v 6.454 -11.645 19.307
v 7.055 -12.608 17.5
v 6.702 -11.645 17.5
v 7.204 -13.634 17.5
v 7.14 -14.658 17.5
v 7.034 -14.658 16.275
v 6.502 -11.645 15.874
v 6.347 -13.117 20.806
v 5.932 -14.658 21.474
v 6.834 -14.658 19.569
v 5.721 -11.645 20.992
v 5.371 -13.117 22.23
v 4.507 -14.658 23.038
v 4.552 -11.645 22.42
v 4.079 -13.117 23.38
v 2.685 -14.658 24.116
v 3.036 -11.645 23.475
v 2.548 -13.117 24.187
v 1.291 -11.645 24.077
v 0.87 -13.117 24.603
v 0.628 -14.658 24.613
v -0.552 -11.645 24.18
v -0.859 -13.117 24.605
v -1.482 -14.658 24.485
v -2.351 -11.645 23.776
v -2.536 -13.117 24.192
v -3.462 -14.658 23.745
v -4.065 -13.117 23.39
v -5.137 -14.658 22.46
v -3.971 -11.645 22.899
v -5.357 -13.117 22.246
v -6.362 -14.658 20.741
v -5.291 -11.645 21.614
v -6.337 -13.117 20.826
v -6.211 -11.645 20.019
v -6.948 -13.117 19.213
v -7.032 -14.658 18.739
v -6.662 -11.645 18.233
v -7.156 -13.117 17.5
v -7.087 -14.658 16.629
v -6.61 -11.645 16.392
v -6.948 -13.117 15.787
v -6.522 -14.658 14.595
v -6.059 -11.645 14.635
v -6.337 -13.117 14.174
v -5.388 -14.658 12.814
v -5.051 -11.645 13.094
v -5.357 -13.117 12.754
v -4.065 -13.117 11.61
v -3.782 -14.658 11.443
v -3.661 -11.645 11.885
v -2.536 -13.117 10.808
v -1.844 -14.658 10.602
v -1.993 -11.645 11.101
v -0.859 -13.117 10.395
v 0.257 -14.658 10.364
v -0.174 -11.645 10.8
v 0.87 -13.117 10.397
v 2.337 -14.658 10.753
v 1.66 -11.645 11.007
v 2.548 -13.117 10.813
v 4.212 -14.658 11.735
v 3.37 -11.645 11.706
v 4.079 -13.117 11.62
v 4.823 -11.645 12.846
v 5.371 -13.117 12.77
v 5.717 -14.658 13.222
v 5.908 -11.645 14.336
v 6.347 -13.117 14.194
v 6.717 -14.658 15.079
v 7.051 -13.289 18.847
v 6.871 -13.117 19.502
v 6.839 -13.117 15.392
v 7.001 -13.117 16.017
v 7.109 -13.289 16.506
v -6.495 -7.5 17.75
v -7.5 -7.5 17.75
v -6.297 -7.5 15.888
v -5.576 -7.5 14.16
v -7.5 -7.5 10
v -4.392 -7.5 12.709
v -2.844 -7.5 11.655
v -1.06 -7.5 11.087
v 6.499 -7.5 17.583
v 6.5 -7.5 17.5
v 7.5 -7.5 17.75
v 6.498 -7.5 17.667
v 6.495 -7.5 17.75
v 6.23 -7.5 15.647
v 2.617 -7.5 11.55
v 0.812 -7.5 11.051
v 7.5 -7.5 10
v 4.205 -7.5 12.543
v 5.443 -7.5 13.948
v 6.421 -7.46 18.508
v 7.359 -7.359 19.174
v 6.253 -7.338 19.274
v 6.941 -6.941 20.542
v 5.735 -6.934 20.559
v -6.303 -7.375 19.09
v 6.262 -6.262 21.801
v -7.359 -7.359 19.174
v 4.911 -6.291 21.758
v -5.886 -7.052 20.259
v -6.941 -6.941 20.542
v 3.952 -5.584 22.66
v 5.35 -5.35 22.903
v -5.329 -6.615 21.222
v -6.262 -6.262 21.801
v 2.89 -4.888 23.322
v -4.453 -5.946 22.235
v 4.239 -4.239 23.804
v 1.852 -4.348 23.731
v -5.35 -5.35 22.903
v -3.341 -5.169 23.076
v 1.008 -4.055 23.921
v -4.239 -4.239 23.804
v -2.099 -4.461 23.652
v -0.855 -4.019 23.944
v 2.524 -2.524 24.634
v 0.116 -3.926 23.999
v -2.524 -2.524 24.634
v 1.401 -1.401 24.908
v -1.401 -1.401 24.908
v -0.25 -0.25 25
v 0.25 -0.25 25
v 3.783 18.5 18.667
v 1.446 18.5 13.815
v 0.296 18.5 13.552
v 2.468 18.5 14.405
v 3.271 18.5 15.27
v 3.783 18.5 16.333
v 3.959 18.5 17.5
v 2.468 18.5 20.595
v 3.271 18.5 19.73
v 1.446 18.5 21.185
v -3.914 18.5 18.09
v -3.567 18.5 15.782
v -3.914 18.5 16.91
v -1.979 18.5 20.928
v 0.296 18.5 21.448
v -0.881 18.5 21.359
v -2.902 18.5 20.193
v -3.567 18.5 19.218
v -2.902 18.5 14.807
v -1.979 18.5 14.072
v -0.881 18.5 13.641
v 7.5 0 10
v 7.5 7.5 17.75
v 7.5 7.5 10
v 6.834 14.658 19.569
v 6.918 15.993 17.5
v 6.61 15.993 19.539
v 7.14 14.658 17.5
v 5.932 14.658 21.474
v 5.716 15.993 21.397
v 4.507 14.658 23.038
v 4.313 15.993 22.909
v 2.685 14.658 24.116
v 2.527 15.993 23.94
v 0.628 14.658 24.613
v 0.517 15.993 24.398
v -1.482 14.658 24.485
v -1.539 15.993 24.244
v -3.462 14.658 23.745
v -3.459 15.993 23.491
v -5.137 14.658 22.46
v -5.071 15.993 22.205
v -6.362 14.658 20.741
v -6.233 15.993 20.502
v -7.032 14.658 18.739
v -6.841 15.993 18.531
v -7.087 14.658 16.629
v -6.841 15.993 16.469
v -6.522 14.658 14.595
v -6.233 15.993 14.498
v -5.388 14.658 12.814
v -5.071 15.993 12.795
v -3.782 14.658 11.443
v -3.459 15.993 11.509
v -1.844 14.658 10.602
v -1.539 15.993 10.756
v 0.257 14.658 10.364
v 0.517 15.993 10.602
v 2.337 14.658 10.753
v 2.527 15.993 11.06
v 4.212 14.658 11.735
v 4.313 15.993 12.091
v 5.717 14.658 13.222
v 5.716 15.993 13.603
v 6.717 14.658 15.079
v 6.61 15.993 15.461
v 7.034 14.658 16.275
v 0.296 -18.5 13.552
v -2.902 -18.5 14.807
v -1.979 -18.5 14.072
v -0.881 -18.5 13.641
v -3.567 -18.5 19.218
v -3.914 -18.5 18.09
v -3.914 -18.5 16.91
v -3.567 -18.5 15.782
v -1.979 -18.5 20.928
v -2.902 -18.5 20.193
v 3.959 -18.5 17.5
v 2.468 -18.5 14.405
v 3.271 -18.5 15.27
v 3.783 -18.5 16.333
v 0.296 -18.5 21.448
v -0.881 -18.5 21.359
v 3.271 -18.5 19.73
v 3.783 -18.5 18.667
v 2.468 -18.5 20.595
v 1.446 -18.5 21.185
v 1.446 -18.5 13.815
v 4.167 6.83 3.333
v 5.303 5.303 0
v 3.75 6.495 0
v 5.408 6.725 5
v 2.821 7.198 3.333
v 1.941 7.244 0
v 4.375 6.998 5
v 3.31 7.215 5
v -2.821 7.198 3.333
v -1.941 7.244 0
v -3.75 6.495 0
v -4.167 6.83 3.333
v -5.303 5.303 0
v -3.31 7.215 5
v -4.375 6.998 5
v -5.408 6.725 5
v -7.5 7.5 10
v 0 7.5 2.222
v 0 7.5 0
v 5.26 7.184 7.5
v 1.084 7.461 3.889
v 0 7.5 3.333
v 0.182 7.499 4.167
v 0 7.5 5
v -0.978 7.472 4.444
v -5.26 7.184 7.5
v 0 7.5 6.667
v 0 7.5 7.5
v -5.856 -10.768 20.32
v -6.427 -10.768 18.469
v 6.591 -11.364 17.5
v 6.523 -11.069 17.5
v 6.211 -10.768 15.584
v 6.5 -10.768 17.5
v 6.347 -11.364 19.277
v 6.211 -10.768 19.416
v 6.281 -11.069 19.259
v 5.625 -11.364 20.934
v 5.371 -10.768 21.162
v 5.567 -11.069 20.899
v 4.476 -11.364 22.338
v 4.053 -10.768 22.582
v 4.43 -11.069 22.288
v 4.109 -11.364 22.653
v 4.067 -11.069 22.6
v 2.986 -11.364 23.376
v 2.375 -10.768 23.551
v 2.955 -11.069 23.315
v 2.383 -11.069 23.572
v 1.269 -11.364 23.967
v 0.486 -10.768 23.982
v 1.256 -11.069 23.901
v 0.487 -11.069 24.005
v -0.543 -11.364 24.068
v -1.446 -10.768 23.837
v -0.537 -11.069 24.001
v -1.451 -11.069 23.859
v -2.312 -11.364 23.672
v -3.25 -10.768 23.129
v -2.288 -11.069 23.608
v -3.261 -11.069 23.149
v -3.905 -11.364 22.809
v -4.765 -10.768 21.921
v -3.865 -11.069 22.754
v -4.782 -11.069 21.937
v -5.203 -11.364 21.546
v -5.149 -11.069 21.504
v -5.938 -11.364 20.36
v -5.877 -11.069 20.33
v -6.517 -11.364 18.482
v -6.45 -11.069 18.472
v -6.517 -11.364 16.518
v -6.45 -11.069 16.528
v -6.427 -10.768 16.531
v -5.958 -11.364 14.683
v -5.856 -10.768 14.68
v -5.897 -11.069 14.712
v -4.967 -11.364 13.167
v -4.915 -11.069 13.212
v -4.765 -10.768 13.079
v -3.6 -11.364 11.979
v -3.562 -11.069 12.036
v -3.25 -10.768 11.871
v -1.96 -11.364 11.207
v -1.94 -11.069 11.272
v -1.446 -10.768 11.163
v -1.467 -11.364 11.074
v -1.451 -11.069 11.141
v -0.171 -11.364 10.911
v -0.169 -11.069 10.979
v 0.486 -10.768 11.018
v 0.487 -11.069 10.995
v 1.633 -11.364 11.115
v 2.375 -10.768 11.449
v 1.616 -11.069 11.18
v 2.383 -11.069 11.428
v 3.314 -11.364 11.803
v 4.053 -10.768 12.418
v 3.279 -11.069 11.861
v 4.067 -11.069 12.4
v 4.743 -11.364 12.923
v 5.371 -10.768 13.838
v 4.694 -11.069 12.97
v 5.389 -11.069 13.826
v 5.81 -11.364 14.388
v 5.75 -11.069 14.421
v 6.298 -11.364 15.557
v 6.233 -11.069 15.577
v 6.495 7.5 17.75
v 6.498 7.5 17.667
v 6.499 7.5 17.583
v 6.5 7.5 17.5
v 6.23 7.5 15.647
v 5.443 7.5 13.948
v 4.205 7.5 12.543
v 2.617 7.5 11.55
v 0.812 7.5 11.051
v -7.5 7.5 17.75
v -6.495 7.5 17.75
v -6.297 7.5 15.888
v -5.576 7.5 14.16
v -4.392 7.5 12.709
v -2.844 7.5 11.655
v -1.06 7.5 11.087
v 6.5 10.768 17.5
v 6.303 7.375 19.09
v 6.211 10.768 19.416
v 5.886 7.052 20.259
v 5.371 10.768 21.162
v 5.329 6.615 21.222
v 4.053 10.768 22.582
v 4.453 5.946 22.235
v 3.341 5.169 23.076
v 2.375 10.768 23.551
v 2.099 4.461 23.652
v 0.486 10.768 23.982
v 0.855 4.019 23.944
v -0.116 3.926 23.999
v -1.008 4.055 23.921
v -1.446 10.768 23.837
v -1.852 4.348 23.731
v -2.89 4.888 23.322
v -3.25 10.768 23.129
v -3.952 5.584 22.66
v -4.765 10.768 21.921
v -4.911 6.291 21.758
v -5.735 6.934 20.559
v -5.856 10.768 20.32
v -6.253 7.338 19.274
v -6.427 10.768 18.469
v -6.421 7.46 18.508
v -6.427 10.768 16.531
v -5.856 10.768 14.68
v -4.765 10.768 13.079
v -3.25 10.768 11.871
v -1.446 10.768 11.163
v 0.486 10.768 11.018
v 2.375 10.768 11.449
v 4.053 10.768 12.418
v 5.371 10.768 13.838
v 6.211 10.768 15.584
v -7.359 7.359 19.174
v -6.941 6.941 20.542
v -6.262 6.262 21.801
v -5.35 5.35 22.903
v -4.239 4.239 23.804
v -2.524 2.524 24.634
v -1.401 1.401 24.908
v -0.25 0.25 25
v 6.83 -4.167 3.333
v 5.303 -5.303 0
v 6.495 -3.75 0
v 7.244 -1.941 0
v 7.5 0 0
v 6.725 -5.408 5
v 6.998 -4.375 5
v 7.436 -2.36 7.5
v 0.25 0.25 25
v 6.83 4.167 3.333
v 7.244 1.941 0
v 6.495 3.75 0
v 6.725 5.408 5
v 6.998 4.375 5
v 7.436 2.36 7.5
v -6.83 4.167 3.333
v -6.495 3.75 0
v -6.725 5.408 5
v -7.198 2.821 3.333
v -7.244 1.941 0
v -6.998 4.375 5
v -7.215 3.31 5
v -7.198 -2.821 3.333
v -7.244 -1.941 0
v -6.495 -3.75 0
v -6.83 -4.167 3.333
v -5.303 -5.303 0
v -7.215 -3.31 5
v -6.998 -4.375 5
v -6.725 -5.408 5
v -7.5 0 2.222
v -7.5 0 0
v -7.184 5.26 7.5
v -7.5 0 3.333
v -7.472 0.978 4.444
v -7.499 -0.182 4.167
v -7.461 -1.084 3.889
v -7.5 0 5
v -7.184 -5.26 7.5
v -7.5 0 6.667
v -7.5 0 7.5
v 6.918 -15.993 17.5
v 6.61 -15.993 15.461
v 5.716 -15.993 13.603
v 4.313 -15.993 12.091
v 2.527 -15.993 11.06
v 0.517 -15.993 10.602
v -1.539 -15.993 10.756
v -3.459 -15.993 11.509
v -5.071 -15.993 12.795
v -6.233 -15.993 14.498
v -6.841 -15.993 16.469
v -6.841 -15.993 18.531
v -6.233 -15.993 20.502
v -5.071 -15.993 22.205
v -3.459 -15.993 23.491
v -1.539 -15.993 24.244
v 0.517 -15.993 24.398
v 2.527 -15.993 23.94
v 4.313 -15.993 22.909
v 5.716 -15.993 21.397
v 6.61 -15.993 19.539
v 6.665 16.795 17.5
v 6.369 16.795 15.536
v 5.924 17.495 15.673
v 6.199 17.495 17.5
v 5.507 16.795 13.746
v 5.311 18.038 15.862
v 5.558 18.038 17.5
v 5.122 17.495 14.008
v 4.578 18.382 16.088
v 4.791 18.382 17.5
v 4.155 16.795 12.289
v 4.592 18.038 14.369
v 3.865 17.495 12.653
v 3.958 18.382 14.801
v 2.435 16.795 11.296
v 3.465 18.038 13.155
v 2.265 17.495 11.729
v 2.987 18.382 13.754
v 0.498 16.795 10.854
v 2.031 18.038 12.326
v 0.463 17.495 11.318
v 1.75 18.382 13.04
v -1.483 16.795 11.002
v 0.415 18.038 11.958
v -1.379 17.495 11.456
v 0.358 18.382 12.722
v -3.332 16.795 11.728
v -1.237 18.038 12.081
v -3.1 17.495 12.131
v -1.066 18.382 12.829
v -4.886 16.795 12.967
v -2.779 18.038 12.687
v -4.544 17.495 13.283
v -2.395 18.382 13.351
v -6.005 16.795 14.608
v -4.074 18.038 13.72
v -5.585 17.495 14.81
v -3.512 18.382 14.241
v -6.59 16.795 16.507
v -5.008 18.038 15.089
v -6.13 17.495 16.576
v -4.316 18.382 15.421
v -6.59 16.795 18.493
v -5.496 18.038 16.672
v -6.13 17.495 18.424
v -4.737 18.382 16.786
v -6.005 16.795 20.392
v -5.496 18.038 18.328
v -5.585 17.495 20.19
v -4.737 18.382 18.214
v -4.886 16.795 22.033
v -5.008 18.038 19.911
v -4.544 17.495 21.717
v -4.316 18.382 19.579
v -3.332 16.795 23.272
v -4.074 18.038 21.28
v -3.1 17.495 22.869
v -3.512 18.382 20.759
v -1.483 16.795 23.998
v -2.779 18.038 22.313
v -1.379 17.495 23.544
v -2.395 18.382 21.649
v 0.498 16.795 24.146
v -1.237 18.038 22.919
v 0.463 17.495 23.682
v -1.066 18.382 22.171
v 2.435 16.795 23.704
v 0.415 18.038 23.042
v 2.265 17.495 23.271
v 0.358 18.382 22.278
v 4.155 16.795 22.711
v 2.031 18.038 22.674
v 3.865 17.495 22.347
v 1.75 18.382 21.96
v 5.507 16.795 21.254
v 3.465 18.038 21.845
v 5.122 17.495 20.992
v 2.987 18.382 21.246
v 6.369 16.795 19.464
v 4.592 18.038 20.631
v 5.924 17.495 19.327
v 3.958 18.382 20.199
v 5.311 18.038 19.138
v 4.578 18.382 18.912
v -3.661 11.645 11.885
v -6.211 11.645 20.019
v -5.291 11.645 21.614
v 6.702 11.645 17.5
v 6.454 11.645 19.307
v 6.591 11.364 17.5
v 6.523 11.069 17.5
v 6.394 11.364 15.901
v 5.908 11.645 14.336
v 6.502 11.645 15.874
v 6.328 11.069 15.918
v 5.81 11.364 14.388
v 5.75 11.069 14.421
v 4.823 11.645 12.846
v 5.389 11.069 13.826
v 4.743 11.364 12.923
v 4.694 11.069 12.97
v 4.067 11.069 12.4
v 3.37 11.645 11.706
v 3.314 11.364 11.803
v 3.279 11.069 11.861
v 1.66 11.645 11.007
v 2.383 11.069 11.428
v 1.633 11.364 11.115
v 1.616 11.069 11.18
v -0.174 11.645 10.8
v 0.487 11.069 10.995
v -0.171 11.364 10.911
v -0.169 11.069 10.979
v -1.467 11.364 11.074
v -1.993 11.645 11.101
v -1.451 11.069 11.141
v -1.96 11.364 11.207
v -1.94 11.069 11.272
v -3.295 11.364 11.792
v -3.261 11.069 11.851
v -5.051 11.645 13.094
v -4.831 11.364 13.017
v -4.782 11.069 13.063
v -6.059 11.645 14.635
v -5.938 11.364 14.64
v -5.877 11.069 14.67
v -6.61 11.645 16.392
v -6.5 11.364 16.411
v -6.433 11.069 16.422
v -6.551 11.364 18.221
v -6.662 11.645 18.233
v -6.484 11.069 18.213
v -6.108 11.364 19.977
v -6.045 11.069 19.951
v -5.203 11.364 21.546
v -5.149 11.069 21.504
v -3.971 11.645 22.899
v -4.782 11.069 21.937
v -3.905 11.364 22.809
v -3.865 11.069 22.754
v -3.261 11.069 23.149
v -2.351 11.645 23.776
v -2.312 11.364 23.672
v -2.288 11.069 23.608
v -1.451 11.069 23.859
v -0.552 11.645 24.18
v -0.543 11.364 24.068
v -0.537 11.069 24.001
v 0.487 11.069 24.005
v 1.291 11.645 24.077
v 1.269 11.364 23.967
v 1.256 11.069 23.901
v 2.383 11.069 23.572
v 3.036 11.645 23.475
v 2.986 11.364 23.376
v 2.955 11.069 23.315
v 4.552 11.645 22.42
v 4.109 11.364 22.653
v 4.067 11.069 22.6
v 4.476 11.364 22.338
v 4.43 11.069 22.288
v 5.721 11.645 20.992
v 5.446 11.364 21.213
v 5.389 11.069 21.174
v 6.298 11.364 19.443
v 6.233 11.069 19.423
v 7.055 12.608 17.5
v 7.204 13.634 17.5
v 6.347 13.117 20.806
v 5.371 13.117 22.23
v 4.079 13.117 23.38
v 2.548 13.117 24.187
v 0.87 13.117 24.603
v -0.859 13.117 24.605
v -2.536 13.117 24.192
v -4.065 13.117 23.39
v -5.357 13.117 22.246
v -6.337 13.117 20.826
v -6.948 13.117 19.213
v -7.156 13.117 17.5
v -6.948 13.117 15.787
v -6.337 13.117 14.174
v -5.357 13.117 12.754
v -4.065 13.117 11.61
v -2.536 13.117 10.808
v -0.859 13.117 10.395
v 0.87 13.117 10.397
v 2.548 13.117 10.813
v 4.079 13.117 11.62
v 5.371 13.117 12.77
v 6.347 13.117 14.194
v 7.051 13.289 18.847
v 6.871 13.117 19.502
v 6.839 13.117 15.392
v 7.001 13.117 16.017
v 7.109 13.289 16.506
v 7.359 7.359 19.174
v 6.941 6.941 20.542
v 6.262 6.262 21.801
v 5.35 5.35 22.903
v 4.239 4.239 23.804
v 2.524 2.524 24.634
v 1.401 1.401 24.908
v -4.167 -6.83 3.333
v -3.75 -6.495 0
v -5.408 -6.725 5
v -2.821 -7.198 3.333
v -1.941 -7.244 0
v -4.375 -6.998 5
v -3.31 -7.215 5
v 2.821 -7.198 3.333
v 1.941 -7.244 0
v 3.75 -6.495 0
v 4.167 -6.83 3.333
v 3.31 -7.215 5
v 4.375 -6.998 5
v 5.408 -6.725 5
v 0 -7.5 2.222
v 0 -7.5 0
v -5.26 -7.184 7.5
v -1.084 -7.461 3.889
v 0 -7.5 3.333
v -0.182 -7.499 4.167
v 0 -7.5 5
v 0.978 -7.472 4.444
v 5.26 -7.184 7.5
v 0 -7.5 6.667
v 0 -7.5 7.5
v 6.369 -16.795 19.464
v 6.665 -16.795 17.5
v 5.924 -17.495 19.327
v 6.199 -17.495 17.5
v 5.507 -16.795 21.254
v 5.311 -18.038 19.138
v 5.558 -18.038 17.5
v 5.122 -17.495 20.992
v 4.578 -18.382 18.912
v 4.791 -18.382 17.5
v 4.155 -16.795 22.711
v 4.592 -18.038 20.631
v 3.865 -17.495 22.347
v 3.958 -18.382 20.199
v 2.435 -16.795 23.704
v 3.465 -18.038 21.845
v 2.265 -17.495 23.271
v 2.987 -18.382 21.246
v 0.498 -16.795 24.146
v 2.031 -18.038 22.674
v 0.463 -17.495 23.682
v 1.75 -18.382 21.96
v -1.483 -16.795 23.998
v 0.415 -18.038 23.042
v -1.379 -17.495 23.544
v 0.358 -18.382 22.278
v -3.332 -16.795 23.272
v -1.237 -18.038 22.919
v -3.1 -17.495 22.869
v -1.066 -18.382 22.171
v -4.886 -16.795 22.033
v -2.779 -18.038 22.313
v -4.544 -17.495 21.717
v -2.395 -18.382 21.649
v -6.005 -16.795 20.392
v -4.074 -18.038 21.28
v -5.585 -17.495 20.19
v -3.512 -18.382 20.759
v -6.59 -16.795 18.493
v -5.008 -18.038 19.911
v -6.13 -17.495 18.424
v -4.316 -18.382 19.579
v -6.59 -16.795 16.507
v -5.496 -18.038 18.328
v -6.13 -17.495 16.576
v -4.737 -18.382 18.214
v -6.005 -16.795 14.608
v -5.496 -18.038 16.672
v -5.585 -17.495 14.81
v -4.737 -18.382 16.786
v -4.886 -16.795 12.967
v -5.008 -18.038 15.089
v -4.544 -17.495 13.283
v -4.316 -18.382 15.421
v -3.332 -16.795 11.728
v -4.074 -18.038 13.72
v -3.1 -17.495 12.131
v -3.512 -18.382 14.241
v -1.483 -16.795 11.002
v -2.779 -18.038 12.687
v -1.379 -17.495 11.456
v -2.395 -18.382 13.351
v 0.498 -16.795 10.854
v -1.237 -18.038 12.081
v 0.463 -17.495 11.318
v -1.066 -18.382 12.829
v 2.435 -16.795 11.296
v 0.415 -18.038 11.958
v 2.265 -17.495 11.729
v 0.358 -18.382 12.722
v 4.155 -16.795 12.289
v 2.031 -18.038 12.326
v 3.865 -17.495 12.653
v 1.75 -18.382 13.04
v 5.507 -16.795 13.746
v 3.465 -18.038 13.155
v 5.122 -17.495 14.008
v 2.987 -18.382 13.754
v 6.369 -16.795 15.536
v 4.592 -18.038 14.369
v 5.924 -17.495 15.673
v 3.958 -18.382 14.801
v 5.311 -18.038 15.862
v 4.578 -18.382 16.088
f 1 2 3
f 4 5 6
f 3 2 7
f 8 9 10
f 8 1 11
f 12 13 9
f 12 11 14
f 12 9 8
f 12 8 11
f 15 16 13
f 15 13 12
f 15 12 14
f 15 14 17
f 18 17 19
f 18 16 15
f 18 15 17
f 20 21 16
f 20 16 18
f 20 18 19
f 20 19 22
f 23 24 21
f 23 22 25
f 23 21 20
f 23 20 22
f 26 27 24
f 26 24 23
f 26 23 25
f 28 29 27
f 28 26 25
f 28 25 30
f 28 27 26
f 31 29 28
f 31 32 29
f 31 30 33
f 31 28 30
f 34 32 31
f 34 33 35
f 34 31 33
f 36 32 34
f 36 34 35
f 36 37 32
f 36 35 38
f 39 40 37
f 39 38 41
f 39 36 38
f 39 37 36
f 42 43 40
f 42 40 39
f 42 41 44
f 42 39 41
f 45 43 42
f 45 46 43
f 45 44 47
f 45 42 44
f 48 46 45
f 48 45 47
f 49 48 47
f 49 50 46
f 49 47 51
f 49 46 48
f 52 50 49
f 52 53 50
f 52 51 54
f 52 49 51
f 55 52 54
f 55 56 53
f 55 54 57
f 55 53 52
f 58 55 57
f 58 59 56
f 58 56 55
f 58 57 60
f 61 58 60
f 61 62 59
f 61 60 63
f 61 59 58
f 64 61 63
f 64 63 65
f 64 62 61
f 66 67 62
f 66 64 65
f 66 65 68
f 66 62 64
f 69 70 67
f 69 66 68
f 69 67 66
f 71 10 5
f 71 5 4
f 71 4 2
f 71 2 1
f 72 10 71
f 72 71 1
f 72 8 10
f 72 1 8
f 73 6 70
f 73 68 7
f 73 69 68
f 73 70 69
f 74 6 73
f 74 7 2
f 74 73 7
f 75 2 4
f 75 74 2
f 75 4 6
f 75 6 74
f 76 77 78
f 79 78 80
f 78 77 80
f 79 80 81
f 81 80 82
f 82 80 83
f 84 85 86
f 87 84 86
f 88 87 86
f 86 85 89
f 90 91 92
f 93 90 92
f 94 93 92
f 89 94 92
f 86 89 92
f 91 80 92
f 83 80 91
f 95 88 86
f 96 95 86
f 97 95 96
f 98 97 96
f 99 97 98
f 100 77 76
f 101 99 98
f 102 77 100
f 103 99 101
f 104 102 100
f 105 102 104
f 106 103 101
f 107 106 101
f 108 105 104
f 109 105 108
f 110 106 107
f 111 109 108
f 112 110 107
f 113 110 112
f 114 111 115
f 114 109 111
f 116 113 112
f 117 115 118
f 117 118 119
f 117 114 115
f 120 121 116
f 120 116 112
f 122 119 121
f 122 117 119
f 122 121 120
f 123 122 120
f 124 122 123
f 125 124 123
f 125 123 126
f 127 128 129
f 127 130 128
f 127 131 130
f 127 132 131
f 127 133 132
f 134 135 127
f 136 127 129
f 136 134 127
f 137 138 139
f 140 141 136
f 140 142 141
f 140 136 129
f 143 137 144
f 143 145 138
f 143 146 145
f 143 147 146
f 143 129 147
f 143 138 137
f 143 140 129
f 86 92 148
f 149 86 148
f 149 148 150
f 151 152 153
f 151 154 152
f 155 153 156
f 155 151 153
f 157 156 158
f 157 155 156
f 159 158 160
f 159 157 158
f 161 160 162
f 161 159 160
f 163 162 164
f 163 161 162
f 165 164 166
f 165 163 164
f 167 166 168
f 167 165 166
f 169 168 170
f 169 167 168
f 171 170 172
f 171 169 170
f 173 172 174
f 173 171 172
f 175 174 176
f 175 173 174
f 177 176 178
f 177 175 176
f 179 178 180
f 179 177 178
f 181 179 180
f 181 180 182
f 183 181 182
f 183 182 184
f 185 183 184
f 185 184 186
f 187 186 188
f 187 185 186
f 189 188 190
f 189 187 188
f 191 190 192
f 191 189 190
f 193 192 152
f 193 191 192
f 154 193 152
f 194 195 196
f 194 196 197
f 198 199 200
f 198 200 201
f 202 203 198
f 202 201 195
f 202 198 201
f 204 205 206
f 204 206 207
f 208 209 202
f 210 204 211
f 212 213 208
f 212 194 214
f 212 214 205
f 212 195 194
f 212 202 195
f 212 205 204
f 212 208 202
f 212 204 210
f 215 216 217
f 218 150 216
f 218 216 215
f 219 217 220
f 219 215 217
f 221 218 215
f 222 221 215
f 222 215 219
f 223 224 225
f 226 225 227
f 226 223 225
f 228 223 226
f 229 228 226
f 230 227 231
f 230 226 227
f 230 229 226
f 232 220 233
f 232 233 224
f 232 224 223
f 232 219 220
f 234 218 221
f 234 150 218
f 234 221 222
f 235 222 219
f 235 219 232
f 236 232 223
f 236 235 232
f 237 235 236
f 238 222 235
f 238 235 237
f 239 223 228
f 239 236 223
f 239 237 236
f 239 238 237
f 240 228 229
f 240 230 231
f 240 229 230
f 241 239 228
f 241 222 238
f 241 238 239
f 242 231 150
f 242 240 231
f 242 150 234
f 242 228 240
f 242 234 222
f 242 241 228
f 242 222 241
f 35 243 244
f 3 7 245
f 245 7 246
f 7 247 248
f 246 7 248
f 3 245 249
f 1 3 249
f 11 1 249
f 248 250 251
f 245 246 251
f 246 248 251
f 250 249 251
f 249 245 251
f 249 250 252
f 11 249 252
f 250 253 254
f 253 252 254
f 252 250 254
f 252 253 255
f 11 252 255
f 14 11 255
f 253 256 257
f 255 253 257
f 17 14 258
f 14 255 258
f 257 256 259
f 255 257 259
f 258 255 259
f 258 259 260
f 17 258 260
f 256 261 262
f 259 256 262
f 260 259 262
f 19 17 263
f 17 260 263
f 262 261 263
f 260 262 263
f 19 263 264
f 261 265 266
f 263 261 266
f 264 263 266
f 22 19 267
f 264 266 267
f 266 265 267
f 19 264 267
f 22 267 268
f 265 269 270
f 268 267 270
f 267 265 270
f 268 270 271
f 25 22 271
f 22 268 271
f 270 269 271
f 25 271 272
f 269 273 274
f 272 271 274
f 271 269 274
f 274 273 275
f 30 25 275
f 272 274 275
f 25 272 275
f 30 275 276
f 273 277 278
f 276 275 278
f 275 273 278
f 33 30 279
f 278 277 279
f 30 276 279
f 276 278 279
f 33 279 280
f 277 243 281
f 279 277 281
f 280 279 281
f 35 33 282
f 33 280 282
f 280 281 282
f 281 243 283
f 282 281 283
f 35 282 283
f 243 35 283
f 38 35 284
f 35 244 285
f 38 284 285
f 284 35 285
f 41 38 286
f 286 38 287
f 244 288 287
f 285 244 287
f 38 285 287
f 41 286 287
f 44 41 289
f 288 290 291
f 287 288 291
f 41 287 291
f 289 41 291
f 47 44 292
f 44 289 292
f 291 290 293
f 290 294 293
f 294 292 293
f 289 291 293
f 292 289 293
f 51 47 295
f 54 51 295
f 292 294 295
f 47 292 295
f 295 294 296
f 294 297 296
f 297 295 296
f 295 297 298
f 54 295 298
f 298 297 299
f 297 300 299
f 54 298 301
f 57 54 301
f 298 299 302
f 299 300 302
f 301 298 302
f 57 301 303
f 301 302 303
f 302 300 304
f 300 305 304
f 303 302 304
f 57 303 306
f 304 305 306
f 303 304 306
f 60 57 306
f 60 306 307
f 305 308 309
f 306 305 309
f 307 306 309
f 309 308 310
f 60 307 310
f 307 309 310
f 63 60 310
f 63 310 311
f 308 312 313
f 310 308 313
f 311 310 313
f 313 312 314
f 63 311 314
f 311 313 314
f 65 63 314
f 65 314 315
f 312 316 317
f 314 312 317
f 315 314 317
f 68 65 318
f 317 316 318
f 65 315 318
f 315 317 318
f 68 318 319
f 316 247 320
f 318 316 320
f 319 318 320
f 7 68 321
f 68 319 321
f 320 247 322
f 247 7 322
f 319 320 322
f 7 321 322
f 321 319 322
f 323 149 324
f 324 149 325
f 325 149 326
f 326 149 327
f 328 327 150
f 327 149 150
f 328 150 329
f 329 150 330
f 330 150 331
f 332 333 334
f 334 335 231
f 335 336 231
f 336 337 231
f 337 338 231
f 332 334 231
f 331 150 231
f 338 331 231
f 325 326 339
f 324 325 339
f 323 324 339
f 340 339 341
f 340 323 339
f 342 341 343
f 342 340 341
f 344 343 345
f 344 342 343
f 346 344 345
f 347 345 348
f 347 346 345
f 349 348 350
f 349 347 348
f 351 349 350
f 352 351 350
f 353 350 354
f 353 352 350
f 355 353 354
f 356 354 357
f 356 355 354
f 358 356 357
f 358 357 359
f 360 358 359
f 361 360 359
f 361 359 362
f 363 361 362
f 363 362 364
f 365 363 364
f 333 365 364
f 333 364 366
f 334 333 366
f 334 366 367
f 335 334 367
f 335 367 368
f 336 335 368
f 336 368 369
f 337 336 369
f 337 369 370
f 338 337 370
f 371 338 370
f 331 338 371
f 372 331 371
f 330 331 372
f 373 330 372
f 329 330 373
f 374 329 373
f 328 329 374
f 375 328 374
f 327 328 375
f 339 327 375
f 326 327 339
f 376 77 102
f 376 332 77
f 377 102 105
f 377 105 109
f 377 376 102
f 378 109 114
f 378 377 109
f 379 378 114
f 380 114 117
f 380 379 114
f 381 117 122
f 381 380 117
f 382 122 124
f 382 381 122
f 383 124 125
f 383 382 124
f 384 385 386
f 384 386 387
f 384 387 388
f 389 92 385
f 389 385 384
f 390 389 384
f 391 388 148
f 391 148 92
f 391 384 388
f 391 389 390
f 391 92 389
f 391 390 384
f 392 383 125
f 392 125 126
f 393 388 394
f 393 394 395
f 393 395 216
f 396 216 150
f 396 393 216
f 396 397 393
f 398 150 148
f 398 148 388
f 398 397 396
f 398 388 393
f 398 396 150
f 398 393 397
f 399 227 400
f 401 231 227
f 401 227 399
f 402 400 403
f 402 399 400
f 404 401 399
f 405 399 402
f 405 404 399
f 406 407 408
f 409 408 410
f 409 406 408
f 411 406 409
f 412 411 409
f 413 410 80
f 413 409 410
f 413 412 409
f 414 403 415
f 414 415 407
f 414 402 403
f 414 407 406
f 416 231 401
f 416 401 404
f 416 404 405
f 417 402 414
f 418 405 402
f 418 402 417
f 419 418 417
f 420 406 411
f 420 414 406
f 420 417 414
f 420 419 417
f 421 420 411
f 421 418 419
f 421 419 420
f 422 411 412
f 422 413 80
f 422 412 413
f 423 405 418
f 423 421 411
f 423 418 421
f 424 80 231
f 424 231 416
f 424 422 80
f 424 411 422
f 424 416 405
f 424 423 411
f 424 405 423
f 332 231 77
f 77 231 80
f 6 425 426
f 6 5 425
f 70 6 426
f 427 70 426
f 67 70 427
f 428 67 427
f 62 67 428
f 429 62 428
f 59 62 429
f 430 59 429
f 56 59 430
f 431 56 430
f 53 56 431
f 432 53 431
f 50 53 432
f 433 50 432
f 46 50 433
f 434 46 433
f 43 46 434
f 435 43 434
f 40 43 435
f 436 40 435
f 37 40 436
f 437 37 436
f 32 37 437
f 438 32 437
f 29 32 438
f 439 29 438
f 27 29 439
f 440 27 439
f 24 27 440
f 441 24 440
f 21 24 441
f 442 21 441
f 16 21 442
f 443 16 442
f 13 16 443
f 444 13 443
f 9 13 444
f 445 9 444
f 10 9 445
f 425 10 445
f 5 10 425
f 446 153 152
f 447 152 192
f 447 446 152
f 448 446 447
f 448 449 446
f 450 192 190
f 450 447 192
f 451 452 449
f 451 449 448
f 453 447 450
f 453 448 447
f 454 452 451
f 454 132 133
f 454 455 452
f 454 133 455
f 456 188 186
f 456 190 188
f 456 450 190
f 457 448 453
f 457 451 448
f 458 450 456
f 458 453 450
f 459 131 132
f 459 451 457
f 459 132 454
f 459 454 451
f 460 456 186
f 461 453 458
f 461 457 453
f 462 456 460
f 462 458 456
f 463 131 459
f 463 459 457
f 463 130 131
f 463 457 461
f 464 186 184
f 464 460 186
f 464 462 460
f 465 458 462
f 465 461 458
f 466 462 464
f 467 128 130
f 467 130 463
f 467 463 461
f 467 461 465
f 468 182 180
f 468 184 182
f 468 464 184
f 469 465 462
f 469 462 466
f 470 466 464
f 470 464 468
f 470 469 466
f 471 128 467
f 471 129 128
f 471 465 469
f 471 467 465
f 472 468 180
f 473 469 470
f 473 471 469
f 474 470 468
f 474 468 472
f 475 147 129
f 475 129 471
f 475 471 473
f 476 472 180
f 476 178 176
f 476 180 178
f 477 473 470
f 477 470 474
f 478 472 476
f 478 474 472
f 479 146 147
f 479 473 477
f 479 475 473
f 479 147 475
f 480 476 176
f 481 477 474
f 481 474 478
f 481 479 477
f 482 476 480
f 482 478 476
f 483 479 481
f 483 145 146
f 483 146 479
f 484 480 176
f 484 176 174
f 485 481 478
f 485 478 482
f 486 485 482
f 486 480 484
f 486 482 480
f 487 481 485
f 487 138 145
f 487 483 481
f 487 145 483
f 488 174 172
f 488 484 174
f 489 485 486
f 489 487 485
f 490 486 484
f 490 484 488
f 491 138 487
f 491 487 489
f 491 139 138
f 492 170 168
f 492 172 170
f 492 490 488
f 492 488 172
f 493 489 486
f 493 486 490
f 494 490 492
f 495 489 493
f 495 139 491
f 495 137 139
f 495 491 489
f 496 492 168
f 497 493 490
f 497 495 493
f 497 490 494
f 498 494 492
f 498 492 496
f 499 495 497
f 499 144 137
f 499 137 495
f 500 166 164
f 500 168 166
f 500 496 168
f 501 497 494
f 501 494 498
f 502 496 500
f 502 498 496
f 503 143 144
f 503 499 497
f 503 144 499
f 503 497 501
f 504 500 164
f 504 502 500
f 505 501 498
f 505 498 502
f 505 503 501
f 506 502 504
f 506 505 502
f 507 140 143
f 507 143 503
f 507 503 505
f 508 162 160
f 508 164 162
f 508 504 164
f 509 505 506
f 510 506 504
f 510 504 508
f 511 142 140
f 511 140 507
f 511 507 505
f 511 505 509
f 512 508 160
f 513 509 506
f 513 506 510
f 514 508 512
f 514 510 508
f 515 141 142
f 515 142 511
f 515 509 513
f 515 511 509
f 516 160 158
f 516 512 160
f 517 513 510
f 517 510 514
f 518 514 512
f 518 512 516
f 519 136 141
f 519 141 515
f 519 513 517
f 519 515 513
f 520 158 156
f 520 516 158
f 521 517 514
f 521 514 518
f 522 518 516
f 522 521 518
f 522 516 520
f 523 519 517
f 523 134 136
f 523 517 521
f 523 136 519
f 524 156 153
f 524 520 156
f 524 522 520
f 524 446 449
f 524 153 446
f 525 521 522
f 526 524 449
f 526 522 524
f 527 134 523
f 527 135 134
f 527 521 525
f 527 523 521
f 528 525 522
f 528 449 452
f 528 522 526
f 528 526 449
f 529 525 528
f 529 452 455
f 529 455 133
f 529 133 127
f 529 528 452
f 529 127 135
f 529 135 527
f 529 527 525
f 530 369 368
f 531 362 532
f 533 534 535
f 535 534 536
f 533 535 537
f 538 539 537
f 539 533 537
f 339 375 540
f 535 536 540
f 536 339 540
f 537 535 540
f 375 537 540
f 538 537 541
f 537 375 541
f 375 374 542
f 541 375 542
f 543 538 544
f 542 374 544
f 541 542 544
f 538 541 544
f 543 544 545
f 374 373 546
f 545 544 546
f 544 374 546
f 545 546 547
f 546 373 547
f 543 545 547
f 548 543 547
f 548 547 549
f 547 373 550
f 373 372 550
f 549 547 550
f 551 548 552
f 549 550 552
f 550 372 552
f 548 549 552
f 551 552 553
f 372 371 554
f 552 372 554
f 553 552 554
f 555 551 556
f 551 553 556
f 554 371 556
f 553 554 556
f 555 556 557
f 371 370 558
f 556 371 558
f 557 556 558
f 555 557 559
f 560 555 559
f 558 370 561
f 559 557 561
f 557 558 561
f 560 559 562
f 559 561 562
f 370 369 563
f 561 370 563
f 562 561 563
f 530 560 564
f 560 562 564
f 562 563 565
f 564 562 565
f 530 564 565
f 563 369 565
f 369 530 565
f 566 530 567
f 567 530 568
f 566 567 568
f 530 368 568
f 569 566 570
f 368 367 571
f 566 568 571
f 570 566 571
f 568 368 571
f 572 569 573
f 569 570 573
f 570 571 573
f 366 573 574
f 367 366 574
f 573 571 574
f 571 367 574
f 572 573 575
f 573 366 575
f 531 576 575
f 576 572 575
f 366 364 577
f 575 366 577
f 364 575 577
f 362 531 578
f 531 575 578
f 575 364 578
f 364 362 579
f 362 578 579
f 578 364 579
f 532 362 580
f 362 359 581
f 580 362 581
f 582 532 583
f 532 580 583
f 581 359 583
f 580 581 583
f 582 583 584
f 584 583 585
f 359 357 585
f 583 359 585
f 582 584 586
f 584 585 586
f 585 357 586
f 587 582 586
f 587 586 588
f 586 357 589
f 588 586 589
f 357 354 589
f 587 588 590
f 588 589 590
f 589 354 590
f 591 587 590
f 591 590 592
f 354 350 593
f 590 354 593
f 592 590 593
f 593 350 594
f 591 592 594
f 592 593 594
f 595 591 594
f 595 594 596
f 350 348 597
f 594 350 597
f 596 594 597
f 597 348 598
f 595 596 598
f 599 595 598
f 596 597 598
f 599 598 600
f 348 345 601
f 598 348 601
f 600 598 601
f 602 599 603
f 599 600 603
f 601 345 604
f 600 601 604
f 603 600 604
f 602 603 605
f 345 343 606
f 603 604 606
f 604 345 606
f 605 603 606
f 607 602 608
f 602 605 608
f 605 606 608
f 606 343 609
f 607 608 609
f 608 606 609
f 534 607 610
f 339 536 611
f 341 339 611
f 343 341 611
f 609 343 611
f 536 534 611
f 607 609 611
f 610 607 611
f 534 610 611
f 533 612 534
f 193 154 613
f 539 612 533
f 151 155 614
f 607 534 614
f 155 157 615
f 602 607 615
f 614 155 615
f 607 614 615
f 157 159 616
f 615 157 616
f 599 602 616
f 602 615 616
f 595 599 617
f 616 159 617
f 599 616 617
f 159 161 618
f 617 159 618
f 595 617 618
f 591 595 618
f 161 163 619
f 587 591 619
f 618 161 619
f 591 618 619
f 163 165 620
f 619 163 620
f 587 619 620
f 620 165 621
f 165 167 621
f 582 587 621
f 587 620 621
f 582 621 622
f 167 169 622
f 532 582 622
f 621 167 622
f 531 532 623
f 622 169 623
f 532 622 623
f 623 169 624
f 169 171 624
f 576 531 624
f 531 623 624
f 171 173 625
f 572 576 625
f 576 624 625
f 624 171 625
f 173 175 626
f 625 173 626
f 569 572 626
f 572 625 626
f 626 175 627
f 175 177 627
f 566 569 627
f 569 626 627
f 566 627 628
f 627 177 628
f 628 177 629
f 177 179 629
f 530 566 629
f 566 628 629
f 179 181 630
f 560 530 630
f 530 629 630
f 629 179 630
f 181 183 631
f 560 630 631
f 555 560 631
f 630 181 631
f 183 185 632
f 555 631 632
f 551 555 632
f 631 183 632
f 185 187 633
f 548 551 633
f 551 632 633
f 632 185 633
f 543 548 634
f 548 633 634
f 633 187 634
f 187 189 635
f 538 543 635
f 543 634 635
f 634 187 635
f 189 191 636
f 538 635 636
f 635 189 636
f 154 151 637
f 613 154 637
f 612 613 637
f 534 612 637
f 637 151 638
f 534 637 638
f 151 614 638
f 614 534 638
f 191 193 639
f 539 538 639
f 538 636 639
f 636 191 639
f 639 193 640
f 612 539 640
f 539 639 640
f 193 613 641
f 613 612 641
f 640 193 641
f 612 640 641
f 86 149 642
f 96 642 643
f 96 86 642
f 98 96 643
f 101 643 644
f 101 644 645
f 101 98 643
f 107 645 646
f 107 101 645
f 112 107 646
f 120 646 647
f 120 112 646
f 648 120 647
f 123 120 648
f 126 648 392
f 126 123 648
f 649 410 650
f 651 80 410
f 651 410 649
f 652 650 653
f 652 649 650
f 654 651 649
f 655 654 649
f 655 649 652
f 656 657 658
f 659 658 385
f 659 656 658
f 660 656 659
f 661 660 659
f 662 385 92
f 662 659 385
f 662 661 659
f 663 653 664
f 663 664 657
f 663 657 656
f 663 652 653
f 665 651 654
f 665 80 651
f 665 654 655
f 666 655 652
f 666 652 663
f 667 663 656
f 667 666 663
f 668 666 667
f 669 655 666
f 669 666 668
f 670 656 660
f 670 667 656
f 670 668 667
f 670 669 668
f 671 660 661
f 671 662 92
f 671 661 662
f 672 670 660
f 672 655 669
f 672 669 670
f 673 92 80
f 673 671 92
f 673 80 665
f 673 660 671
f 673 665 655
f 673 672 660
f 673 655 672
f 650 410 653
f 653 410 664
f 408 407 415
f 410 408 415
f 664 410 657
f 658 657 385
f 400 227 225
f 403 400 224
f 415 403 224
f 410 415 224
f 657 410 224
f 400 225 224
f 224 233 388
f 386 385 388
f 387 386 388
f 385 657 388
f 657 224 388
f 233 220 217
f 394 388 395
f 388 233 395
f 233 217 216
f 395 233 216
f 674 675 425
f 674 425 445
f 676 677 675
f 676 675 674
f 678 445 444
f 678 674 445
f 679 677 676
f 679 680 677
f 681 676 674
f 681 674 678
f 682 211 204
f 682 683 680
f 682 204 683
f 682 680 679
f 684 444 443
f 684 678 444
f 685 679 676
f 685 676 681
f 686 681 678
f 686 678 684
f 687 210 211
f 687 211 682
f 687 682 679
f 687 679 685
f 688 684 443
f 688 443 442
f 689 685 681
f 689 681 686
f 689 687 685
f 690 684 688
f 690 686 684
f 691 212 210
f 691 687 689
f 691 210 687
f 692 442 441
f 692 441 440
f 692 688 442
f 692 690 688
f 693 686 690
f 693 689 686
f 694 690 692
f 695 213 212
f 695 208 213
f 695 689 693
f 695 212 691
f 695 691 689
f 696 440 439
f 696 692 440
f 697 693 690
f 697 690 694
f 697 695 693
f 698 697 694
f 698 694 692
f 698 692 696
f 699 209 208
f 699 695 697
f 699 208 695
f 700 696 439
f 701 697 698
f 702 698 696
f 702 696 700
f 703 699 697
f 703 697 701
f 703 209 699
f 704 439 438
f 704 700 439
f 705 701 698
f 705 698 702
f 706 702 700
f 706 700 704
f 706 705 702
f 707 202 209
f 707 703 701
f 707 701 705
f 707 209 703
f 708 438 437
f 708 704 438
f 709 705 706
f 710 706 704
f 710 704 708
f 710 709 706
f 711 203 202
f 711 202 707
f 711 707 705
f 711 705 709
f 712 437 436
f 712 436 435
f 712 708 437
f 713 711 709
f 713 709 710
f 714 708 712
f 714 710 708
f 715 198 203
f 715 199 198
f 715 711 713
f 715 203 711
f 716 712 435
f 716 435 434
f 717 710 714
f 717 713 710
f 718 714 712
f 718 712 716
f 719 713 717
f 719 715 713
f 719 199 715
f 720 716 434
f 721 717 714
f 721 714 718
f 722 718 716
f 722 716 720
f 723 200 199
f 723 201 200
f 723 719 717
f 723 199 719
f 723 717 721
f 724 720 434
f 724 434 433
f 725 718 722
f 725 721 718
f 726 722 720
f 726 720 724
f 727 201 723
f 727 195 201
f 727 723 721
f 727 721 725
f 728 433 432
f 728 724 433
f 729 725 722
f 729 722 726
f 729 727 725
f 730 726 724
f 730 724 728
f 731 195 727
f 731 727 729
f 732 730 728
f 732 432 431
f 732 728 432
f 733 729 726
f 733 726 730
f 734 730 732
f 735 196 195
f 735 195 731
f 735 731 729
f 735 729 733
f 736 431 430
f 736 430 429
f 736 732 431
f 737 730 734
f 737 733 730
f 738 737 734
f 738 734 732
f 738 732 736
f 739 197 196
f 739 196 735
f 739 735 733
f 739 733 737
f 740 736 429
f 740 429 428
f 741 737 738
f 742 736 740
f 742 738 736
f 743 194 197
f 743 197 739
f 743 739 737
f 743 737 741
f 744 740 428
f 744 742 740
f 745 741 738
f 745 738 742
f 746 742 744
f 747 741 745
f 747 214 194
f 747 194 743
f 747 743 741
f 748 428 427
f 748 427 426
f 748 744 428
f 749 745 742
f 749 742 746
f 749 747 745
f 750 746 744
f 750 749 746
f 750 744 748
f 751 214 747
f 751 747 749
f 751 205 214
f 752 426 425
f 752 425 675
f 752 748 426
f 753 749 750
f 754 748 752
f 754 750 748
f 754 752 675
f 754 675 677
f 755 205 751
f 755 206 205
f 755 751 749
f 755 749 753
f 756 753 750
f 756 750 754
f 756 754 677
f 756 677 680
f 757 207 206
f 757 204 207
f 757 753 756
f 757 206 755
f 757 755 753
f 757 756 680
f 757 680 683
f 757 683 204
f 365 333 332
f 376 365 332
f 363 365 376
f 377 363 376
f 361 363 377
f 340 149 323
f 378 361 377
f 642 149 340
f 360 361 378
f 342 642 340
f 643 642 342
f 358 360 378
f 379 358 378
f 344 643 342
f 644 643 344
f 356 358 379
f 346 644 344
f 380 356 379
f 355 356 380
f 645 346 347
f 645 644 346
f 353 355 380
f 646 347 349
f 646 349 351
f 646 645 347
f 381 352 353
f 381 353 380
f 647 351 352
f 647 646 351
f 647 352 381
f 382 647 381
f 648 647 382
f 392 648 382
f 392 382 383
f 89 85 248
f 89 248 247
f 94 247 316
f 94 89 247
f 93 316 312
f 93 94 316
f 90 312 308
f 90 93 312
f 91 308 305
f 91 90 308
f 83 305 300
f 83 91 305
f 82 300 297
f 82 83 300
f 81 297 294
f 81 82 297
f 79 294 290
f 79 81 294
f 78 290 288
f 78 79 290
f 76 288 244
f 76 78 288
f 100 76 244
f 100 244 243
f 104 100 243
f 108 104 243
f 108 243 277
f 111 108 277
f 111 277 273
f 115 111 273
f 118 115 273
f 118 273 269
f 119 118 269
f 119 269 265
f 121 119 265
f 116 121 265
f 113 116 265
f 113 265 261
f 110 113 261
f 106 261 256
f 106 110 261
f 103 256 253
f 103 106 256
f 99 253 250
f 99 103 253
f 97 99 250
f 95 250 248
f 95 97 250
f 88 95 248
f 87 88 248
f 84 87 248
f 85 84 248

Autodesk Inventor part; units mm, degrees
sketch "Sketch2" plane through (0, 0, 0) normal (0, 0, 1) x (1, 0, 0)
  circle A0 centre (0, 0) radius 7.5
  dimension "d1" = 15
ref_plane "Work Plane1" through (0, 0, 10) normal (0, 0, 1) x (1, 0, 0)
sketch "Sketch3" plane through (0, 0, 10) normal (0, 0, 1) x (1, 0, 0)
  line L0 (-7.5, -7.5) -> (7.5, -7.5)
  line L1 (7.5, -7.5) -> (7.5, 7.5)
  line L2 (7.5, 7.5) -> (-7.5, 7.5)
  line L3 (-7.5, 7.5) -> (-7.5, -7.5)
  line L4 (-7.5, -7.5) -> (7.5, 7.5) construction
  line L5 (7.5, -7.5) -> (-7.5, 7.5) construction
  point P0 (0, 0)
  dimension "d5" = 15
  dimension "d6" = 15
loft "Loft1" add profiles "Sketch2", "Sketch3"
sketch "Sketch4" plane through (-7.5, -7.5, 10) normal (0, 0, 1) x (1, 0, 0)
  line L0 (12.8033, 12.8033) -> (15, 15) projected
  line L1 (0, 0) -> (15, 0)
  line L2 (15, 0) -> (15, 15)
  line L3 (15, 15) -> (0, 15)
  line L4 (0, 15) -> (0, 0)
  line L5 (0, 0) -> (15, 15) construction
  line L6 (15, 0) -> (0, 15) construction
  point P0 (7.5, 7.5)
  dimension "d11" = 15
  dimension "d12" = 15
extrude "Extrusion2" add sketch "Sketch4" along normal blind 15
sketch "Sketch5" plane through (-7.5, -7.5, 25) normal (0, -1, 0) x (1, 0, 0)
  circle A0 centre (7.5, -7.5) radius 6.5
  point P0 (7.5, -25)
  point P1 (15, -15)
  dimension "d15" = 13
extrude "Extrusion3" add sketch "Sketch5" along normal blind 5
sketch "Sketch6" plane through (0, -12.5, 17.5) normal (0, -1, 0) x (1, 0, 0)
  circle A0 centre (0, 0) radius 7.5
  point P0 (0, -17.5)
  dimension "d24" = 15
ref_plane "Work Plane2" through (0, -18.5, 17.5) normal (0, -1, 0) x (1, 0, 0)
sketch "Sketch7" plane through (0, -18.5, 17.5) normal (0, -1, 0) x (1, 0, 0)
  circle A0 centre (0, 0) radius 6.5
  point P0 (0, -17.5)
loft "Loft2" add profiles "Sketch6", "Sketch7"
fillet "Fillet1" radius 2 1 edges at (-6.5, -12.5, 17.5)
fillet "Fillet2" radius 3 1 edges at (-6.5, -18.5, 17.5)
fillet "Fillet3" radius 5 1 edges at (-7.5, -12.5, 17.5)
ref_plane "Work Plane3" through (-7.5, 0, 25) normal (0, -1, 0) x (1, 0, 0)
mirror "Mirror1" about plane through (-7.5, 0, 25) normal (0, -1, 0) of "Fillet2", "Loft2", "Fillet3", "Fillet1", "Extrusion3"
fillet "Fillet4" radius 7.25 4 edges at (-7.5, 0, 25) (0, 7.5, 25) (7.5, 0, 25) (0, -7.5, 25)
properties part number "Palu"
